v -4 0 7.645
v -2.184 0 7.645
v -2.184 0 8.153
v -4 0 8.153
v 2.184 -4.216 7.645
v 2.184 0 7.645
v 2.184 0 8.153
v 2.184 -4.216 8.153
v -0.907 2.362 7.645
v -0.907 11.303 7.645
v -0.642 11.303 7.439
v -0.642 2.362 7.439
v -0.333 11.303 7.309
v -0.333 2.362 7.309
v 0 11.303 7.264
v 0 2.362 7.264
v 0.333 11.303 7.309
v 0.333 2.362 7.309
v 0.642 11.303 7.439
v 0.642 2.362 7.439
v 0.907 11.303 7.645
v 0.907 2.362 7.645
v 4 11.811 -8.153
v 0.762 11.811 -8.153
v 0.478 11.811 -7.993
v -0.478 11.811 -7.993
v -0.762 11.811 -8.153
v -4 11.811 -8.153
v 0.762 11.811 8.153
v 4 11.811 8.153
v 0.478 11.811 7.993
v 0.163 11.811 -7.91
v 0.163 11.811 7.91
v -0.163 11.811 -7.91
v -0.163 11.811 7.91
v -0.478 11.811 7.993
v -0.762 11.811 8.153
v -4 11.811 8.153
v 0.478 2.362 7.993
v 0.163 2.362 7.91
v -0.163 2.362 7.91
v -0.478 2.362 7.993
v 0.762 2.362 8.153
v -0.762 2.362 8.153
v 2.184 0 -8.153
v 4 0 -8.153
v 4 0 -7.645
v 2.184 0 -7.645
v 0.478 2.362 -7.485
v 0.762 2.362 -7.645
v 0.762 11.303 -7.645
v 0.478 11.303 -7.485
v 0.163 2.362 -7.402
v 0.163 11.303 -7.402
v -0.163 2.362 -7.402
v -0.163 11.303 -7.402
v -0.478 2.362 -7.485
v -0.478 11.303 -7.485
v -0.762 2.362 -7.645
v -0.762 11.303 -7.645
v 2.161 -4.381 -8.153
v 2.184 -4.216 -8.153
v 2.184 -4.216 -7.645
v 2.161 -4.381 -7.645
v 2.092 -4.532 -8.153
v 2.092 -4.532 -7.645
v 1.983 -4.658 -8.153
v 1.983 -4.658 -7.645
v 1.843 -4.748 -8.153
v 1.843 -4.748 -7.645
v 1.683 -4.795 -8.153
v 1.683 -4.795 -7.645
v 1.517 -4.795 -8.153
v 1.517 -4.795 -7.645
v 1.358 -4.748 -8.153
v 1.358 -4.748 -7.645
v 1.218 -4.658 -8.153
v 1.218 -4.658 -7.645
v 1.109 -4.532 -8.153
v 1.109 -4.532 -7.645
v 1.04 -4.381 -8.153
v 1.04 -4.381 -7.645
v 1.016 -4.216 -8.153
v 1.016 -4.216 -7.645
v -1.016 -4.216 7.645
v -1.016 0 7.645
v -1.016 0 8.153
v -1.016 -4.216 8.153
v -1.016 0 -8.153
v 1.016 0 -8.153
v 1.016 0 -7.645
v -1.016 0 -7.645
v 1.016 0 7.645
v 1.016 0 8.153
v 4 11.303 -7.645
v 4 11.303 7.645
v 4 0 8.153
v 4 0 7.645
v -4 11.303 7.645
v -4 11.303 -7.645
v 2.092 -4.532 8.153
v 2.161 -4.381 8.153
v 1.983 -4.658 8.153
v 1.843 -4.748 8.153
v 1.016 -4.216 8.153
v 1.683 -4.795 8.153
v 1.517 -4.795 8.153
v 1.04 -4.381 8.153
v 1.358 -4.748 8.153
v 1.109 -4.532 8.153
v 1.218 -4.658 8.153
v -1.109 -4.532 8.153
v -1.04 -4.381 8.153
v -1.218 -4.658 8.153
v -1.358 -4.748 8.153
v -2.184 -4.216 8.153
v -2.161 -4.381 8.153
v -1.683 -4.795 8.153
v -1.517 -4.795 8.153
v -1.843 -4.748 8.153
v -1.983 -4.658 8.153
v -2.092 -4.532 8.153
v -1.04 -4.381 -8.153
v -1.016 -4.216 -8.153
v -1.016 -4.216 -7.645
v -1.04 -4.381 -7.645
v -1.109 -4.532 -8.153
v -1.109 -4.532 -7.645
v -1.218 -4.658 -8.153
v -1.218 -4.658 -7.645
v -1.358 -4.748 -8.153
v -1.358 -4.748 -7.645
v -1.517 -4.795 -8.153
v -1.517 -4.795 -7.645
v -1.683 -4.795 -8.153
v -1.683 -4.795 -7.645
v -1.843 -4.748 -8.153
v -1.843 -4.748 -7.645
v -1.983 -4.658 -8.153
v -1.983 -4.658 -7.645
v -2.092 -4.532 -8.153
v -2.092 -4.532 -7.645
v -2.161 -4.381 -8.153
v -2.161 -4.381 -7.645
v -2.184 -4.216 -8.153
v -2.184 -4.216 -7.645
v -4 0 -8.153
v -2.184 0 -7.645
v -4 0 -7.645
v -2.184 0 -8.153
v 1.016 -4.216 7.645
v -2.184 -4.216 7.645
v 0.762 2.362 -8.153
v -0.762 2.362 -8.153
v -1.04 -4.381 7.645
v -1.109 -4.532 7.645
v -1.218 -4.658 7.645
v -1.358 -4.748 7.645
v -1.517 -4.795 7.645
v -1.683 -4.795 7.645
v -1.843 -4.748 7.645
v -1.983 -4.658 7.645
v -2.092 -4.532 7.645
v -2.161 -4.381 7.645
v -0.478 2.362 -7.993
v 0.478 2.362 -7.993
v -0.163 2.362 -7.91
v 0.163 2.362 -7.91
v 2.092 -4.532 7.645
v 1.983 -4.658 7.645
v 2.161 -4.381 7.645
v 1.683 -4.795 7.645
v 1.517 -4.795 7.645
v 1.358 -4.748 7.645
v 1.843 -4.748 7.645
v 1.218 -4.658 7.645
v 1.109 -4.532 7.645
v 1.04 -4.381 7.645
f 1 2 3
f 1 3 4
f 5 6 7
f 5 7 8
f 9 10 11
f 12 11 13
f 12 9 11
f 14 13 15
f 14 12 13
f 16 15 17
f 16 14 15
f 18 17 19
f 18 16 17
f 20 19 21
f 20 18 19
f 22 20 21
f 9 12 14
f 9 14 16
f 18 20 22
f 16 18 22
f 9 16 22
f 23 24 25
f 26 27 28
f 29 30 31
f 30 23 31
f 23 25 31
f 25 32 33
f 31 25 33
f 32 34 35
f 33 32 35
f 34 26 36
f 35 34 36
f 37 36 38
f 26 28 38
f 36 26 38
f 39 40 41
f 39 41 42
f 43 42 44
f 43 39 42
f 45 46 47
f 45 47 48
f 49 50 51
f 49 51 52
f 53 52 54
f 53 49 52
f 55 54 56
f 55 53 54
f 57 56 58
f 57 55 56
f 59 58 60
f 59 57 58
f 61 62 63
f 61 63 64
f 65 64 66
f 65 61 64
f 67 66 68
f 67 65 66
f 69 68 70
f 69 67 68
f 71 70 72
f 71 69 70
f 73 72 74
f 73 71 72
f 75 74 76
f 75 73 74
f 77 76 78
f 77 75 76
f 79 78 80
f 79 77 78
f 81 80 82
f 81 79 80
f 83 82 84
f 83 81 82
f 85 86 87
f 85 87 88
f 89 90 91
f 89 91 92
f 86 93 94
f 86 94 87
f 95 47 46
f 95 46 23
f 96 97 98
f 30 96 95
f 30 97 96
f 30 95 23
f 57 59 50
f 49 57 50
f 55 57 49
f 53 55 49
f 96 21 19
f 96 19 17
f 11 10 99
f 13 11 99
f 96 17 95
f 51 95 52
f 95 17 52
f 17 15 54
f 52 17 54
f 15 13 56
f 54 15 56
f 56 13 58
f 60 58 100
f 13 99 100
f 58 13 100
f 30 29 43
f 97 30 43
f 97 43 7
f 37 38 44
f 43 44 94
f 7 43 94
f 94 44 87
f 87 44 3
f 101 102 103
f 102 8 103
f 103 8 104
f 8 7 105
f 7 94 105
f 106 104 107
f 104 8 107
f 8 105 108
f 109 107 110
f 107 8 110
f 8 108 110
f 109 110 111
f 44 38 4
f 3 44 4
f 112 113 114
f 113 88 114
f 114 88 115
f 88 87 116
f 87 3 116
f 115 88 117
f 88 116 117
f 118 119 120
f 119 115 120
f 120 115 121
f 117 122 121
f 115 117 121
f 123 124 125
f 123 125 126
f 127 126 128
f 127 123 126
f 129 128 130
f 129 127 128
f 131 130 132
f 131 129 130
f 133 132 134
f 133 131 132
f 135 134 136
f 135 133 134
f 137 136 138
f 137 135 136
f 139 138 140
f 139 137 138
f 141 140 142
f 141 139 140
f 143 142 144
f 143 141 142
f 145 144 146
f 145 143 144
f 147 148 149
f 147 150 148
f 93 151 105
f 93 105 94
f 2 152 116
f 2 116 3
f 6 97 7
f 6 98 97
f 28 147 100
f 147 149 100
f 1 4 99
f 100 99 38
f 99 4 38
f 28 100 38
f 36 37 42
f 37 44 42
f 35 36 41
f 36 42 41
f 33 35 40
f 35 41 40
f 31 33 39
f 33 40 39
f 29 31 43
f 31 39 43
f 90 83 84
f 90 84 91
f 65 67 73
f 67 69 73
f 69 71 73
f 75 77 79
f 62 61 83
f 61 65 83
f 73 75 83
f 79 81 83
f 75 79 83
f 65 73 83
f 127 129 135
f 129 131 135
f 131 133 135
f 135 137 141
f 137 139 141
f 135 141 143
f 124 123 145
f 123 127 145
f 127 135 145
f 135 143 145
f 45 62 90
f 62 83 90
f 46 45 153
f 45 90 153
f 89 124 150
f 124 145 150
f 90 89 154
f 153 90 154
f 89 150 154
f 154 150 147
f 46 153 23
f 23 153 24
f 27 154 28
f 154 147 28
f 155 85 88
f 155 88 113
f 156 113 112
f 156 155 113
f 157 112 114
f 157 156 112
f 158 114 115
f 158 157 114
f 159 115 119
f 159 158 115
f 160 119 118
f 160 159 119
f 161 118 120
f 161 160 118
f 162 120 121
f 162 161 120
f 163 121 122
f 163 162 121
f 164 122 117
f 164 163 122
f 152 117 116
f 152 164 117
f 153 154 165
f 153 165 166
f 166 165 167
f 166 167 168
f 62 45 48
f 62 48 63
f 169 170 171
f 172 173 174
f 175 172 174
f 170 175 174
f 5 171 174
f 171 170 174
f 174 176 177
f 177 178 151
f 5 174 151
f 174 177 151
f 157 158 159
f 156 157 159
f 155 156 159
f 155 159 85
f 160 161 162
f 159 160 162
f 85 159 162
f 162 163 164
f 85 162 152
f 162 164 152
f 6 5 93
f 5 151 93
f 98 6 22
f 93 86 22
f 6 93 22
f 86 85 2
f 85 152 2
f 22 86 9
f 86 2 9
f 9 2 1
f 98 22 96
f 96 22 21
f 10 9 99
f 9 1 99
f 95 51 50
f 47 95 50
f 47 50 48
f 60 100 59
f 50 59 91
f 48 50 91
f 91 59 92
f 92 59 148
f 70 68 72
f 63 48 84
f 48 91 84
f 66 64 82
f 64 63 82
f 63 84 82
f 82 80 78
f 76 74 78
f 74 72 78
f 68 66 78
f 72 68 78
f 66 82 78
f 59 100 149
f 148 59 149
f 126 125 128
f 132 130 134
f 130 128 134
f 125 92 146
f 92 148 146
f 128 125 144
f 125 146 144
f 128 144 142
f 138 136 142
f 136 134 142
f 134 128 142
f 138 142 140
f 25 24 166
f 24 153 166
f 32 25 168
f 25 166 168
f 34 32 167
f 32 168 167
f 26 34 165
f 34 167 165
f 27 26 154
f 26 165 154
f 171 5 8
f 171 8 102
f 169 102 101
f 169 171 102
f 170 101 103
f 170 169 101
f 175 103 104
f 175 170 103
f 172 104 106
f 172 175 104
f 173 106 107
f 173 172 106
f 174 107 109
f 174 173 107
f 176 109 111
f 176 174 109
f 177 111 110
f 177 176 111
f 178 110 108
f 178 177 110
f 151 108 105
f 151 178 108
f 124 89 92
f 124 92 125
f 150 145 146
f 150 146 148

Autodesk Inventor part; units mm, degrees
sketch "Sketch_1" plane through (0, 0, 0) normal (1, 0, 0) x (0, 1, 0)
  line L0 (-4.8006, 8.1534) -> (-4.8006, 7.6454)
  line L1 (-4.8006, 7.6454) -> (11.303, 7.6454)
  line L2 (11.303, 7.6454) -> (11.303, -7.6454)
  line L3 (11.303, -7.6454) -> (-4.8006, -7.6454)
  line L4 (-4.8006, -7.6454) -> (-4.8006, -8.1534)
  line L5 (-4.8006, -8.1534) -> (11.811, -8.1534)
  line L6 (11.811, -8.1534) -> (11.811, 8.1534)
  line L7 (11.811, 8.1534) -> (-4.8006, 8.1534)
extrude "Extrusion1" add sketch "Sketch_1" along normal mid plane 8.001
sketch "Sketch_2" plane through (0, 0, 0) normal (0, 0, 1) x (1, 0, 0)
  line L0 (-4.0005, 0) -> (-4.0005, -4.953)
  line L1 (-4.0005, -4.953) -> (4.0005, -4.953)
  line L2 (4.0005, -4.953) -> (4.0005, 0)
  line L3 (4.0005, 0) -> (2.1844, 0)
  line L4 (2.1844, 0) -> (2.1844, -4.2164)
  arc A0 (1.016, -4.2164) -> (2.1844, -4.2164) centre (1.6002, -4.2164) ccw
  line L5 (1.016, -4.2164) -> (1.016, 0)
  line L6 (1.016, 0) -> (-1.016, 0)
  line L7 (-1.016, 0) -> (-1.016, -4.2164)
  arc A1 (-2.1844, -4.2164) -> (-1.016, -4.2164) centre (-1.6002, -4.2164) ccw
  line L8 (-2.1844, -4.2164) -> (-2.1844, 0)
  line L9 (-2.1844, 0) -> (-4.0005, 0)
extrude "Extrusion2" cut sketch "Sketch_2" along normal mid plane 16.3068
sketch "Sketch_3" plane through (0, 2.3622, 0) normal (0, 1, 0) x (1, 0, 0)
  arc A0 (-0.762, 7.6454) -> (0.762, 7.6454) centre (0, 8.6614) ccw
  line L0 (0.762, 7.6454) -> (-0.762, 7.6454)
extrude "Extrusion3" add sketch "Sketch_3" along normal blind 9.4488
sketch "Sketch_4" plane through (0, 2.3622, 0) normal (0, 1, 0) x (1, 0, 0)
  arc A0 (-1.27, 9.1694) -> (1.27, 9.1694) centre (0, 9.1694) ccw
  line L0 (1.27, 9.1694) -> (-1.27, 9.1694)
extrude "Extrusion4" cut sketch "Sketch_4" along normal blind 9.4488
sketch "Sketch_5" plane through (0, 2.3622, 0) normal (0, 1, 0) x (1, 0, 0)
  line L0 (-0.907, -7.6454) -> (0.907, -7.6454)
  arc A0 (0.907, -7.6454) -> (-0.907, -7.6454) centre (0, -8.5344) ccw
extrude "Extrusion5" add sketch "Sketch_5" along normal blind 9.4488
sketch "Sketch_6" plane through (0, 2.3622, 0) normal (0, 1, 0) x (1, 0, 0)
  line L0 (-1.27, -9.1694) -> (1.27, -9.1694)
  arc A0 (1.27, -9.1694) -> (-1.27, -9.1694) centre (0, -9.1694) ccw
extrude "Extrusion6" cut sketch "Sketch_6" along normal blind 9.4488
ref_plane "bracket_to_switch_XY" through (0, 11.303, 0) normal (0, 1, 0) x (1, 0, 0)
ref_plane "bracket_to_switch_YZ" through (0, 11.303, 0) normal (1, 0, 0) x (0, 0, -1)
ref_plane "bracket_to_switch_ZX" through (0, 11.303, 0) normal (0, 0, -1) x (0, 1, 0)
properties part number "BBRACKET13"
